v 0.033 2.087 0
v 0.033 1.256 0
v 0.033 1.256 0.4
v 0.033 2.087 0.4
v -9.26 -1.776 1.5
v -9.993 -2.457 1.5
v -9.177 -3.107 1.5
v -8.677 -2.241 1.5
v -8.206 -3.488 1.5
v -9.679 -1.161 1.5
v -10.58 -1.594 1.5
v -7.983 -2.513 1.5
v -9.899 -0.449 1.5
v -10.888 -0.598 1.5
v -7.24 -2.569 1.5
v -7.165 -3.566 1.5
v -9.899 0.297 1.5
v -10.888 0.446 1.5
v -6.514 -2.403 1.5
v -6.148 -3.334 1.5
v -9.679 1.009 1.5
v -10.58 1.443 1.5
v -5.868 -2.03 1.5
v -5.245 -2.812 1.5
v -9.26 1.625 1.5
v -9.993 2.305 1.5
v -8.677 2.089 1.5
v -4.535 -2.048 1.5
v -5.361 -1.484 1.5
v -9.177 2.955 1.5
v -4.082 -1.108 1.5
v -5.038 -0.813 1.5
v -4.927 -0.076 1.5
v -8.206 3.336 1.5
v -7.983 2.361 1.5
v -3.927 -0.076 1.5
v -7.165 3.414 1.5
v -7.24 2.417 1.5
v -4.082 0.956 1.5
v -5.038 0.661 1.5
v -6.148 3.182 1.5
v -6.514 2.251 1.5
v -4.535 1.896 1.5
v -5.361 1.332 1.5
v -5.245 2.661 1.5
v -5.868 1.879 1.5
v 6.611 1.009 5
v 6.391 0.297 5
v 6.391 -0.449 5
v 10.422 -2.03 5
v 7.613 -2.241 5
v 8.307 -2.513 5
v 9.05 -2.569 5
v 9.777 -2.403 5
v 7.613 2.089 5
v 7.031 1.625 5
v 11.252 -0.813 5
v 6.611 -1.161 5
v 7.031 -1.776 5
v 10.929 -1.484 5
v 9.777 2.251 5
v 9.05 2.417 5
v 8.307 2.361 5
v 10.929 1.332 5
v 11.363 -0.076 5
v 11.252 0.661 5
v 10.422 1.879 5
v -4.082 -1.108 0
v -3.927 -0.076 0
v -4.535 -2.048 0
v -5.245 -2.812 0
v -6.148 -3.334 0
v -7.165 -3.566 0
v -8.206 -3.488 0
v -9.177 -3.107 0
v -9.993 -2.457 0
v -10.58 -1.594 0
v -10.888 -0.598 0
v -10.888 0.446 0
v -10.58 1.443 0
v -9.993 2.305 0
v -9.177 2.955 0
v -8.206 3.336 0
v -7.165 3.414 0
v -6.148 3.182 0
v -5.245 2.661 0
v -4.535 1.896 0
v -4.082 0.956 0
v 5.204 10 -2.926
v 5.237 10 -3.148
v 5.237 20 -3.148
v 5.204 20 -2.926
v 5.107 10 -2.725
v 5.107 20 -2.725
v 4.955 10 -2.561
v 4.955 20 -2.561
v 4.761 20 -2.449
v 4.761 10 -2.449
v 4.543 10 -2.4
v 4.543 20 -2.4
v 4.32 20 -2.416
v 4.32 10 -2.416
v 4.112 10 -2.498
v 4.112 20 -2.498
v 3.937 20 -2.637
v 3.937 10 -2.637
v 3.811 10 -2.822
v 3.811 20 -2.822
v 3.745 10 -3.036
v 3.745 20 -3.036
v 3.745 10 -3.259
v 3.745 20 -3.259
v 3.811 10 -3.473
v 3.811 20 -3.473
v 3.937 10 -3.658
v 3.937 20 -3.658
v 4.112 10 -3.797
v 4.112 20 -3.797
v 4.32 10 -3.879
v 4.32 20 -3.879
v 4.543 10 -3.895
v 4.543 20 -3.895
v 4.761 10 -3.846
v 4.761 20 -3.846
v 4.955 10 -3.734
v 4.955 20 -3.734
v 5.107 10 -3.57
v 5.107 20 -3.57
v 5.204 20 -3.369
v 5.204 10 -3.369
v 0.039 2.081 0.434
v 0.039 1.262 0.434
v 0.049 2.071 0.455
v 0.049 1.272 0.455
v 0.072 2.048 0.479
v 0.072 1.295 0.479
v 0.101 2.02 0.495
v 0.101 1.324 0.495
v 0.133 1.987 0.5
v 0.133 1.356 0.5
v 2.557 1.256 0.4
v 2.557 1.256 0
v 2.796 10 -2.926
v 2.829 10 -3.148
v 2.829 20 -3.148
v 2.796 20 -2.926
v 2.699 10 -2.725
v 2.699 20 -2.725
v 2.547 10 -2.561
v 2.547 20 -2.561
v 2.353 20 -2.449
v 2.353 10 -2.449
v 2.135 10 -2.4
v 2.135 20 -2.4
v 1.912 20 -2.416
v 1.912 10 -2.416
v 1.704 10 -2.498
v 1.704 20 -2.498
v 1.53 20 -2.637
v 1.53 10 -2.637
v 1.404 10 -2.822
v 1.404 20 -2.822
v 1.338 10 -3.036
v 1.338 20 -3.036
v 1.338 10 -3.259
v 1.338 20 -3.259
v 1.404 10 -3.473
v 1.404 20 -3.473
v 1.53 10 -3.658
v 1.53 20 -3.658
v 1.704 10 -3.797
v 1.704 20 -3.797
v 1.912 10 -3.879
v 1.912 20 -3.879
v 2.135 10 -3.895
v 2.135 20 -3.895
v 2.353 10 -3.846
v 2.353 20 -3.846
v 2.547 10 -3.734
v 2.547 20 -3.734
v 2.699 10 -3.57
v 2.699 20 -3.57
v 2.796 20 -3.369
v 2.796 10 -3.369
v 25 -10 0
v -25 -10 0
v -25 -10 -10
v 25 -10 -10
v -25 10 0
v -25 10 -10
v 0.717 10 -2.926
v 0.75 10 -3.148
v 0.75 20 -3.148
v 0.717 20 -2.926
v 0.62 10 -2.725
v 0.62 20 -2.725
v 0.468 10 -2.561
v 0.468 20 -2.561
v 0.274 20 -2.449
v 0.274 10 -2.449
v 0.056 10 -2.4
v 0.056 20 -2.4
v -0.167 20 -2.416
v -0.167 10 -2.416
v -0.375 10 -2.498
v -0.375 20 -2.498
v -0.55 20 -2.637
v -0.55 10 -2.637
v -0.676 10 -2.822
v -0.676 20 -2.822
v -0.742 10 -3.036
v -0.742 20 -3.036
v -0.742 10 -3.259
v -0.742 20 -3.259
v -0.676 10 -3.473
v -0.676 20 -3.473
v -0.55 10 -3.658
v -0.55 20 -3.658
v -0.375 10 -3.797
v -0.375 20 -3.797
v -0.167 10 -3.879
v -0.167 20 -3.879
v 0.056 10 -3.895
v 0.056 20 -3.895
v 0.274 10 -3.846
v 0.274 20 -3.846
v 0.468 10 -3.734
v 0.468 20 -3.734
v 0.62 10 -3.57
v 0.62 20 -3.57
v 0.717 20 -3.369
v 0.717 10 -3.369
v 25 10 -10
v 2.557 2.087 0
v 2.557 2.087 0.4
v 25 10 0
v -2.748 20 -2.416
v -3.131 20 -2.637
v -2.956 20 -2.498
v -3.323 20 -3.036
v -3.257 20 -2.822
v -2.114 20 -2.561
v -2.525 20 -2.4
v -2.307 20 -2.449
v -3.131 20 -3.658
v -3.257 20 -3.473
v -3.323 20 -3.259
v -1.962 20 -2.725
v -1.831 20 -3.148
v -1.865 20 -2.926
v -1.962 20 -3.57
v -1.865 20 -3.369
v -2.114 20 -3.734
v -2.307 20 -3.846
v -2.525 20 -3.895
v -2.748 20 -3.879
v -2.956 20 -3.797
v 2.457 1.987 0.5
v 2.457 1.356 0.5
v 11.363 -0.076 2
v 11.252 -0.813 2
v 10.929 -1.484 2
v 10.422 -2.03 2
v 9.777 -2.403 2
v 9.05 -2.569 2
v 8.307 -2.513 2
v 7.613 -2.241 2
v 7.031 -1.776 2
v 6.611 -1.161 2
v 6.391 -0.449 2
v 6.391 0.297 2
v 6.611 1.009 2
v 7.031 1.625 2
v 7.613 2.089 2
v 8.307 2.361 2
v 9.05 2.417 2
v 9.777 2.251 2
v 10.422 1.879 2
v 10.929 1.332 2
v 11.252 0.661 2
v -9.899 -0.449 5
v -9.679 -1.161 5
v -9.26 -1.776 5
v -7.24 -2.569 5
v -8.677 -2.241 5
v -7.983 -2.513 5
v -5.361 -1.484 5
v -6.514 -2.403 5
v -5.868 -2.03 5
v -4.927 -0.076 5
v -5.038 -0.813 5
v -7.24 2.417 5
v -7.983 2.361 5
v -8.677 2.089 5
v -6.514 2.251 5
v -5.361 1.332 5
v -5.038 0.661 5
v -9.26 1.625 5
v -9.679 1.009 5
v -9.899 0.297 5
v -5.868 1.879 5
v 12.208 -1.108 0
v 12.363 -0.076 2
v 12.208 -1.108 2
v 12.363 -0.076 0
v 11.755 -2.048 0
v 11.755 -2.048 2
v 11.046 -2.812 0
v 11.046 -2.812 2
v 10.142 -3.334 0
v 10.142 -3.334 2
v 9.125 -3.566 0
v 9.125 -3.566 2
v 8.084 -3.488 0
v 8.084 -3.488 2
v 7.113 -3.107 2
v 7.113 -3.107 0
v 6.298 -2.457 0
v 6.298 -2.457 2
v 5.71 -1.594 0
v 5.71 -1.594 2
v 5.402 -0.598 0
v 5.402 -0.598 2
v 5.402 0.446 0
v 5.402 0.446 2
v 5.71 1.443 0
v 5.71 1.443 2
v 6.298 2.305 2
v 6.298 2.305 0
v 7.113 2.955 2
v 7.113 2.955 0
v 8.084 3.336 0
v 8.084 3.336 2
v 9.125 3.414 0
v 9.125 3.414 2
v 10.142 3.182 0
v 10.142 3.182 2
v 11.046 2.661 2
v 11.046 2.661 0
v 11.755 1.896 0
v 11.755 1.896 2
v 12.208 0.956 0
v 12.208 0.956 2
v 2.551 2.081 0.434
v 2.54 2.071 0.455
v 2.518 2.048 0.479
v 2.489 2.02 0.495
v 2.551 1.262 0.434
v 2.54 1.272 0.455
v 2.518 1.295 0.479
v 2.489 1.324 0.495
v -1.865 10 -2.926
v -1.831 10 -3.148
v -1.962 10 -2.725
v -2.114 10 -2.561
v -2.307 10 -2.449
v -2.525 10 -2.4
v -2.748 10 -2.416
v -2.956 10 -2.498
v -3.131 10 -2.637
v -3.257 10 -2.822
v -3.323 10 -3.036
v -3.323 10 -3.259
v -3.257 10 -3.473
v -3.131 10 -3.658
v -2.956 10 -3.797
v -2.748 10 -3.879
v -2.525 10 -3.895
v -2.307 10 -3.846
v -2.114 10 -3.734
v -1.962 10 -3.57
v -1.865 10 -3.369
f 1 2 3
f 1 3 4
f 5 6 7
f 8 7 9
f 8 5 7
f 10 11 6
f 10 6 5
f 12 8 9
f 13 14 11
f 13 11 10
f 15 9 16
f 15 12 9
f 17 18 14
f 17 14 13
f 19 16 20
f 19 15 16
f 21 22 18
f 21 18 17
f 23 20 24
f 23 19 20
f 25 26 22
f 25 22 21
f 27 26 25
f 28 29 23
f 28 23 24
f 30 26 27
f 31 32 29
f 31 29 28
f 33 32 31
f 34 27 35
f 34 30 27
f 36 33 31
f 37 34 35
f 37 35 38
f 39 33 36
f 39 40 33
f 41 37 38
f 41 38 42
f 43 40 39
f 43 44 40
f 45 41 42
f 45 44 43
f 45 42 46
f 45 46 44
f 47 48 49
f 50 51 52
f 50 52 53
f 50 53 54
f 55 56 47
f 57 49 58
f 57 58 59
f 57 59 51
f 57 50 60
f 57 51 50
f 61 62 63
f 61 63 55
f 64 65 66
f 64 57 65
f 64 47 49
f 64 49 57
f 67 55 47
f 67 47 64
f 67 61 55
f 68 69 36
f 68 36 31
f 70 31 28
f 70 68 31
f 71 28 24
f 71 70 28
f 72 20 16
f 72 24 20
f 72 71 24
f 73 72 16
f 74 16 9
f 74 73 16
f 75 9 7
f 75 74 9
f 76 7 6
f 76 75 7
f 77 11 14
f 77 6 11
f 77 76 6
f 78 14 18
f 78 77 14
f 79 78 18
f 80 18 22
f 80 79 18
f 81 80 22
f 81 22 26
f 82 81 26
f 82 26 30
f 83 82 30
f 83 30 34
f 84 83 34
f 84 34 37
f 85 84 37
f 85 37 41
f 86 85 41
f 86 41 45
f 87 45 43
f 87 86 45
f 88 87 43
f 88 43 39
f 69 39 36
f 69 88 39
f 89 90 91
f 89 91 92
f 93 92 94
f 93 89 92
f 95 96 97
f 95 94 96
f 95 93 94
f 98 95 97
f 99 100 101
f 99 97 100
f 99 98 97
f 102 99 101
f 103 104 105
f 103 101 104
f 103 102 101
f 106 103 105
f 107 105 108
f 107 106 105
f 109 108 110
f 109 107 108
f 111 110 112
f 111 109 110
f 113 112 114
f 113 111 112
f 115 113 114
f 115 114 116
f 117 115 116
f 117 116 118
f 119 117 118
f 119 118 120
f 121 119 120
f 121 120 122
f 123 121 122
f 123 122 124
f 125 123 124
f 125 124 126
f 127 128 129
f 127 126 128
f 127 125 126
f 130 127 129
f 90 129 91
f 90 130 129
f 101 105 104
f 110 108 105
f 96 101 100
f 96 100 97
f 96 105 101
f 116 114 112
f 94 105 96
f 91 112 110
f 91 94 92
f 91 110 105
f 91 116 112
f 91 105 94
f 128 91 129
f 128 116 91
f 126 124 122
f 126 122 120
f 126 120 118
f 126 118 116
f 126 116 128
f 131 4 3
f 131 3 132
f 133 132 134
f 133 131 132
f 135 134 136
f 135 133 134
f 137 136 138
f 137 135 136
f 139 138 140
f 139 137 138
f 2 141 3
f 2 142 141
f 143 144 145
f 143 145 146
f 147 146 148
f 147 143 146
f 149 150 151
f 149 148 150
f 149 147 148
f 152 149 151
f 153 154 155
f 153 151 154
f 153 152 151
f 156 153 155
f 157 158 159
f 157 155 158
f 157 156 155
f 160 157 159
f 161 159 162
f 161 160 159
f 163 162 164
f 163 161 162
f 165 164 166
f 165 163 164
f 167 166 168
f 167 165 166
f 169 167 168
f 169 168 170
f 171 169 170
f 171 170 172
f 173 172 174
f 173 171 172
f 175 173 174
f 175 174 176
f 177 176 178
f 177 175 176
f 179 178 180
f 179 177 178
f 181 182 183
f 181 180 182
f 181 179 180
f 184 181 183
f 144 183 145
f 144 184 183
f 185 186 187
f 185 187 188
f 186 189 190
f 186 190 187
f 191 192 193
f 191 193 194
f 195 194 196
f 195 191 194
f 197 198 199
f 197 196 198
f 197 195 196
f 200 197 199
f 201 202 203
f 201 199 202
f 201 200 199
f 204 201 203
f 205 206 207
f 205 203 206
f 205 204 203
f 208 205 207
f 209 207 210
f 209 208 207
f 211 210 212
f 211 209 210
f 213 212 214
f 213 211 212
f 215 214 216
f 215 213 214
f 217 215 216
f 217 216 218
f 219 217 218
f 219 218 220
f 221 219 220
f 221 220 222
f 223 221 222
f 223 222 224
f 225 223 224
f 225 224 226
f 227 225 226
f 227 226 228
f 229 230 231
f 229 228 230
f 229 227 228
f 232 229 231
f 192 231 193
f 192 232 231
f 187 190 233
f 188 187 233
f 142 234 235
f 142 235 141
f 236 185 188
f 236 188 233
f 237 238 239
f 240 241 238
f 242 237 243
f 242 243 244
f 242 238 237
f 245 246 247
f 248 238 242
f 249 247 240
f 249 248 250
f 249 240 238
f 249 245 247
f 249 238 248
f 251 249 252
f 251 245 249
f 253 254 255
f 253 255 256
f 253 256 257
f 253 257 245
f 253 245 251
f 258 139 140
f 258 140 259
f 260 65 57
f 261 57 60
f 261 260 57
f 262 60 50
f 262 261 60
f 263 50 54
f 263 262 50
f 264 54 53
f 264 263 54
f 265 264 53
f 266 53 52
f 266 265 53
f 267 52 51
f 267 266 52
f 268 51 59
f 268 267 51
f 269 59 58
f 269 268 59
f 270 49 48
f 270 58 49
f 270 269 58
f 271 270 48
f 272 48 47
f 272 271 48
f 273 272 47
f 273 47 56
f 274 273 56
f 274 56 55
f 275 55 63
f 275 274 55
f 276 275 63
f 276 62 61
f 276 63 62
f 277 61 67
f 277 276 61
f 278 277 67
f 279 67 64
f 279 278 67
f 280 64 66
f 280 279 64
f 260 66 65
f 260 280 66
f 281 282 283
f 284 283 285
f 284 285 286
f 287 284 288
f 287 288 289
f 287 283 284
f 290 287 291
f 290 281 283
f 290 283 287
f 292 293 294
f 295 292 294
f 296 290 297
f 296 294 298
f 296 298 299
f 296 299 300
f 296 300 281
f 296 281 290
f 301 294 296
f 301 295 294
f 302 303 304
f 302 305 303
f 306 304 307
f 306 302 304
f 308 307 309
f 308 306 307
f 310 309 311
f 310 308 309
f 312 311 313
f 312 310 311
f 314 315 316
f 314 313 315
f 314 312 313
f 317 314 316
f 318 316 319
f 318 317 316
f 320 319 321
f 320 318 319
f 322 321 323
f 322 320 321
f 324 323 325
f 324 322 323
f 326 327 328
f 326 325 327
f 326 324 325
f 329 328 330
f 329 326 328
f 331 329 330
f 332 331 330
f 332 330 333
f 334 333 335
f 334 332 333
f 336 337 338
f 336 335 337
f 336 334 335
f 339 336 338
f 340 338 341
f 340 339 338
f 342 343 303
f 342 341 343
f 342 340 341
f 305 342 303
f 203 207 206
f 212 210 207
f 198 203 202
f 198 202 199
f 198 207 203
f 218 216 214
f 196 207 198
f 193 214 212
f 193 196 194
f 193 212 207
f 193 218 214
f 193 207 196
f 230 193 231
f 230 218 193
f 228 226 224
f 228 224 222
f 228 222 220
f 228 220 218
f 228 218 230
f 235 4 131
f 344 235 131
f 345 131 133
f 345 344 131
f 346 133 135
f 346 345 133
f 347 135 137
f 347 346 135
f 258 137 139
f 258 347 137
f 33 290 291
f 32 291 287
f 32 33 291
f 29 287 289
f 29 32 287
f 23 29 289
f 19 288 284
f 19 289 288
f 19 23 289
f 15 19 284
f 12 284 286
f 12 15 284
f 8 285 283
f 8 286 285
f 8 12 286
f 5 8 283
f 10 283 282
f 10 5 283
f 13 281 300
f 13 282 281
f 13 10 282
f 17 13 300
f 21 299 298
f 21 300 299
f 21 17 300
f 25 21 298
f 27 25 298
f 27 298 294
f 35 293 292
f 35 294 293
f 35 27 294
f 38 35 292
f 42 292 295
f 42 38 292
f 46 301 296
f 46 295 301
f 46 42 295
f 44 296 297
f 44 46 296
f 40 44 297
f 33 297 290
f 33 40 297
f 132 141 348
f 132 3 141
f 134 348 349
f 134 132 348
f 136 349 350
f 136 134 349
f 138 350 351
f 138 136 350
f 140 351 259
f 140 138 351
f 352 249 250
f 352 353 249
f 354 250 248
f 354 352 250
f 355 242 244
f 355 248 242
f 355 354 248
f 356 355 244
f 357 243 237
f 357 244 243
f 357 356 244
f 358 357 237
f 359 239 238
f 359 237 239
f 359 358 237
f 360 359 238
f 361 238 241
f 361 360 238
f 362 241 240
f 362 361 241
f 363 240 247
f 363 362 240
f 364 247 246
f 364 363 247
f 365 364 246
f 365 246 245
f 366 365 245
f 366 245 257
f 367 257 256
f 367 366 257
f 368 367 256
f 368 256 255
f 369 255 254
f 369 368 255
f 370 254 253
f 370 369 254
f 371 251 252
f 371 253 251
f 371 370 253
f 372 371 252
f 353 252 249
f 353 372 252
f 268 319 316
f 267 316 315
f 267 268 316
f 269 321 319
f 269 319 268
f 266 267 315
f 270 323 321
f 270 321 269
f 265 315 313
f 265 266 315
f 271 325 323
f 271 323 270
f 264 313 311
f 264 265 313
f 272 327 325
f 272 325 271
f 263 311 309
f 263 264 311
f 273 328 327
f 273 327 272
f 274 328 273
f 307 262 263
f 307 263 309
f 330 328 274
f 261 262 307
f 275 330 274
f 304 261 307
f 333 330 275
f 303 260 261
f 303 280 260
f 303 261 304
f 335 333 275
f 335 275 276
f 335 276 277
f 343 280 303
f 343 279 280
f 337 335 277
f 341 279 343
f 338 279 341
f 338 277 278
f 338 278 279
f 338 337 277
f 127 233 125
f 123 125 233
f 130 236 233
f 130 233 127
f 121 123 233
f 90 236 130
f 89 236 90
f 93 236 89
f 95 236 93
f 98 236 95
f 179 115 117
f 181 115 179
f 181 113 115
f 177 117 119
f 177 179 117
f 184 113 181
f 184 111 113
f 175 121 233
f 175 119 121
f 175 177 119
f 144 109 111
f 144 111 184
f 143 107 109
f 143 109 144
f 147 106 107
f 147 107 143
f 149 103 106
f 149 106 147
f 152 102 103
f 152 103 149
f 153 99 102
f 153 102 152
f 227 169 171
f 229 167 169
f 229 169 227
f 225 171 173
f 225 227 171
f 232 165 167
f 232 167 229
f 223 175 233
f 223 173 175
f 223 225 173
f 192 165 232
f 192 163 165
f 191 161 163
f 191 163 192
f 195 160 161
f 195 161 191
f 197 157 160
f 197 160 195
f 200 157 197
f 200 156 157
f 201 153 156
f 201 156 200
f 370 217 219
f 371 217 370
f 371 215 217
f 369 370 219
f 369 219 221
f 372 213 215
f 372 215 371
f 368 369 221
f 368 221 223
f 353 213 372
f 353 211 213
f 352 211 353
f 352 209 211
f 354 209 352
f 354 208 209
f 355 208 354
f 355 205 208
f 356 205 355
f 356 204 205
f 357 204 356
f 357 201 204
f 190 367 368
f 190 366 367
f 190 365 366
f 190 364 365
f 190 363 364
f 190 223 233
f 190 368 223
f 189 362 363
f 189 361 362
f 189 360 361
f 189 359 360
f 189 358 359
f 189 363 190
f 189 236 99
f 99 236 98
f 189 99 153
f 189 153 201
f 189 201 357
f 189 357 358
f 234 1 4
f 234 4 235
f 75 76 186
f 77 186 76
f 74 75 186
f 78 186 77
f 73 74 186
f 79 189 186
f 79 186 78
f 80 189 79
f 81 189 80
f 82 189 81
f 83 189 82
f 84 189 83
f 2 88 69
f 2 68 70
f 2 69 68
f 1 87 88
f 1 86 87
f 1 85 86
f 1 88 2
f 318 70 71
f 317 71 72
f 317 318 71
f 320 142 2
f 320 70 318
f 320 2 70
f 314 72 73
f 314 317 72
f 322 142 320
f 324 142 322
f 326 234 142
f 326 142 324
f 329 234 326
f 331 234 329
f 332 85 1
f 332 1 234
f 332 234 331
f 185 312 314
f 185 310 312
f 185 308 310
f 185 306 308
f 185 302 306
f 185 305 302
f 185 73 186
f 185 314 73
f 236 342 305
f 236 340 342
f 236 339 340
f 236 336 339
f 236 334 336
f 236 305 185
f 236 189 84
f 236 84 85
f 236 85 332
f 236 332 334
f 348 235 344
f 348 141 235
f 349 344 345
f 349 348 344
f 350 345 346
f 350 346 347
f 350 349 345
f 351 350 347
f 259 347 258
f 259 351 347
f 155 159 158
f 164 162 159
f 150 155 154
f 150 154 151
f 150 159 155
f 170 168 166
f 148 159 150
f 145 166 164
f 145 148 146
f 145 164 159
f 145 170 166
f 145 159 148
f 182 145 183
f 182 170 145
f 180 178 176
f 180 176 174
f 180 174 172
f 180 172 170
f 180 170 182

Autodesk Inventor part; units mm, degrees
ref_plane "YZ Plane" through (0, 0, 0) normal (1, 0, 0) x (0, 1, 0)
ref_plane "XZ Plane" through (0, 0, 0) normal (0, 1, 0) x (-1, 0, 0)
ref_plane "XY Plane" through (0, 0, 0) normal (0, 0, 1) x (1, 0, 0)
sketch "Sketch1" plane through (0, 0, 0) normal (0, 0, 1) x (1, 0, 0)
  line L0 (-25, -10) -> (25, -10)
  line L1 (25, -10) -> (25, 10)
  line L2 (25, 10) -> (-25, 10)
  line L3 (-25, 10) -> (-25, -10)
  line L4 (-25, -10) -> (25, 10) construction
  line L5 (25, -10) -> (-25, 10) construction
  circle A0 centre (-7.427, -0.0759) radius 3.5
  circle A1 centre (8.8633, -0.0759) radius 3.5
  line L6 (0.033, 2.0872) -> (2.5566, 2.0872)
  line L7 (2.5566, 2.0872) -> (2.5566, 1.2559)
  line L8 (2.5566, 1.2559) -> (0.033, 1.2559)
  line L9 (0.033, 1.2559) -> (0.033, 2.0872)
  line L10 (0.033, 2.0872) -> (2.5566, 1.2559) construction
  line L11 (2.5566, 2.0872) -> (0.033, 1.2559) construction
  circle A2 centre (-7.427, -0.0759) radius 2.5
  circle A3 centre (8.8633, -0.0759) radius 2.5
  point P0 (0, 0)
  point P1 (1.2948, 1.6716)
  dimension "d0" = 7
  dimension "d1" = 7
  dimension "d11" = 5
  dimension "d12" = 5
  dimension "d28" = 50
  dimension "d29" = 20
extrude "Extrusion1" add sketch "Sketch1" against normal blind 10 contours L3 L2 L1 L0 | A0 | A1 | L6 L7 L8 L9 | A2 | A3
extrude "Extrusion2" add sketch "Sketch1" along normal blind 1.5 contours A0 | A2
extrude "Extrusion3" add sketch "Sketch1" along normal blind 2 contours A1 | A3
extrude "Extrusion4" add sketch "Sketch1" along normal blind 0.5 contours L6 L7 L8 L9
fillet "Fillet1" radius 0.1 4 edges at (1.2948, 2.0872, 0.5) (2.5566, 1.6716, 0.5) (1.2948, 1.2559, 0.5) (0.033, 1.6716, 0.5)
extrude "Extrusion5" add sketch "Sketch1" along normal blind 5 contours A2
extrude "Extrusion6" add sketch "Sketch1" along normal blind 5 contours A3
sketch "Sketch3" plane through (-25, 10, 0) normal (0, 1, 0) x (1, 0, 0)
  circle A0 centre (29.4869, 3.1475) radius 0.75
  circle A1 centre (27.0793, 3.1475) radius 0.75
  circle A2 centre (25, 3.1475) radius 0.75
  circle A3 centre (22.4188, 3.1475) radius 0.75
  point P0 (25, 0)
  dimension "d19" = 1.5
  dimension "d20" = 1.5
  dimension "d21" = 1.5
  dimension "d22" = 1.5
extrude "Extrusion8" add sketch "Sketch3" along normal blind 10 contours A0 | A2 | A3
extrude "Extrusion9" add sketch "Sketch3" along normal blind 10 contours A1
sketch "Sketch4" plane through (0, 0, 0) normal (0, 0, 1) x (1, 0, 0)
  point P0 (0, 0)
properties part number "ultrasonic sensor"
